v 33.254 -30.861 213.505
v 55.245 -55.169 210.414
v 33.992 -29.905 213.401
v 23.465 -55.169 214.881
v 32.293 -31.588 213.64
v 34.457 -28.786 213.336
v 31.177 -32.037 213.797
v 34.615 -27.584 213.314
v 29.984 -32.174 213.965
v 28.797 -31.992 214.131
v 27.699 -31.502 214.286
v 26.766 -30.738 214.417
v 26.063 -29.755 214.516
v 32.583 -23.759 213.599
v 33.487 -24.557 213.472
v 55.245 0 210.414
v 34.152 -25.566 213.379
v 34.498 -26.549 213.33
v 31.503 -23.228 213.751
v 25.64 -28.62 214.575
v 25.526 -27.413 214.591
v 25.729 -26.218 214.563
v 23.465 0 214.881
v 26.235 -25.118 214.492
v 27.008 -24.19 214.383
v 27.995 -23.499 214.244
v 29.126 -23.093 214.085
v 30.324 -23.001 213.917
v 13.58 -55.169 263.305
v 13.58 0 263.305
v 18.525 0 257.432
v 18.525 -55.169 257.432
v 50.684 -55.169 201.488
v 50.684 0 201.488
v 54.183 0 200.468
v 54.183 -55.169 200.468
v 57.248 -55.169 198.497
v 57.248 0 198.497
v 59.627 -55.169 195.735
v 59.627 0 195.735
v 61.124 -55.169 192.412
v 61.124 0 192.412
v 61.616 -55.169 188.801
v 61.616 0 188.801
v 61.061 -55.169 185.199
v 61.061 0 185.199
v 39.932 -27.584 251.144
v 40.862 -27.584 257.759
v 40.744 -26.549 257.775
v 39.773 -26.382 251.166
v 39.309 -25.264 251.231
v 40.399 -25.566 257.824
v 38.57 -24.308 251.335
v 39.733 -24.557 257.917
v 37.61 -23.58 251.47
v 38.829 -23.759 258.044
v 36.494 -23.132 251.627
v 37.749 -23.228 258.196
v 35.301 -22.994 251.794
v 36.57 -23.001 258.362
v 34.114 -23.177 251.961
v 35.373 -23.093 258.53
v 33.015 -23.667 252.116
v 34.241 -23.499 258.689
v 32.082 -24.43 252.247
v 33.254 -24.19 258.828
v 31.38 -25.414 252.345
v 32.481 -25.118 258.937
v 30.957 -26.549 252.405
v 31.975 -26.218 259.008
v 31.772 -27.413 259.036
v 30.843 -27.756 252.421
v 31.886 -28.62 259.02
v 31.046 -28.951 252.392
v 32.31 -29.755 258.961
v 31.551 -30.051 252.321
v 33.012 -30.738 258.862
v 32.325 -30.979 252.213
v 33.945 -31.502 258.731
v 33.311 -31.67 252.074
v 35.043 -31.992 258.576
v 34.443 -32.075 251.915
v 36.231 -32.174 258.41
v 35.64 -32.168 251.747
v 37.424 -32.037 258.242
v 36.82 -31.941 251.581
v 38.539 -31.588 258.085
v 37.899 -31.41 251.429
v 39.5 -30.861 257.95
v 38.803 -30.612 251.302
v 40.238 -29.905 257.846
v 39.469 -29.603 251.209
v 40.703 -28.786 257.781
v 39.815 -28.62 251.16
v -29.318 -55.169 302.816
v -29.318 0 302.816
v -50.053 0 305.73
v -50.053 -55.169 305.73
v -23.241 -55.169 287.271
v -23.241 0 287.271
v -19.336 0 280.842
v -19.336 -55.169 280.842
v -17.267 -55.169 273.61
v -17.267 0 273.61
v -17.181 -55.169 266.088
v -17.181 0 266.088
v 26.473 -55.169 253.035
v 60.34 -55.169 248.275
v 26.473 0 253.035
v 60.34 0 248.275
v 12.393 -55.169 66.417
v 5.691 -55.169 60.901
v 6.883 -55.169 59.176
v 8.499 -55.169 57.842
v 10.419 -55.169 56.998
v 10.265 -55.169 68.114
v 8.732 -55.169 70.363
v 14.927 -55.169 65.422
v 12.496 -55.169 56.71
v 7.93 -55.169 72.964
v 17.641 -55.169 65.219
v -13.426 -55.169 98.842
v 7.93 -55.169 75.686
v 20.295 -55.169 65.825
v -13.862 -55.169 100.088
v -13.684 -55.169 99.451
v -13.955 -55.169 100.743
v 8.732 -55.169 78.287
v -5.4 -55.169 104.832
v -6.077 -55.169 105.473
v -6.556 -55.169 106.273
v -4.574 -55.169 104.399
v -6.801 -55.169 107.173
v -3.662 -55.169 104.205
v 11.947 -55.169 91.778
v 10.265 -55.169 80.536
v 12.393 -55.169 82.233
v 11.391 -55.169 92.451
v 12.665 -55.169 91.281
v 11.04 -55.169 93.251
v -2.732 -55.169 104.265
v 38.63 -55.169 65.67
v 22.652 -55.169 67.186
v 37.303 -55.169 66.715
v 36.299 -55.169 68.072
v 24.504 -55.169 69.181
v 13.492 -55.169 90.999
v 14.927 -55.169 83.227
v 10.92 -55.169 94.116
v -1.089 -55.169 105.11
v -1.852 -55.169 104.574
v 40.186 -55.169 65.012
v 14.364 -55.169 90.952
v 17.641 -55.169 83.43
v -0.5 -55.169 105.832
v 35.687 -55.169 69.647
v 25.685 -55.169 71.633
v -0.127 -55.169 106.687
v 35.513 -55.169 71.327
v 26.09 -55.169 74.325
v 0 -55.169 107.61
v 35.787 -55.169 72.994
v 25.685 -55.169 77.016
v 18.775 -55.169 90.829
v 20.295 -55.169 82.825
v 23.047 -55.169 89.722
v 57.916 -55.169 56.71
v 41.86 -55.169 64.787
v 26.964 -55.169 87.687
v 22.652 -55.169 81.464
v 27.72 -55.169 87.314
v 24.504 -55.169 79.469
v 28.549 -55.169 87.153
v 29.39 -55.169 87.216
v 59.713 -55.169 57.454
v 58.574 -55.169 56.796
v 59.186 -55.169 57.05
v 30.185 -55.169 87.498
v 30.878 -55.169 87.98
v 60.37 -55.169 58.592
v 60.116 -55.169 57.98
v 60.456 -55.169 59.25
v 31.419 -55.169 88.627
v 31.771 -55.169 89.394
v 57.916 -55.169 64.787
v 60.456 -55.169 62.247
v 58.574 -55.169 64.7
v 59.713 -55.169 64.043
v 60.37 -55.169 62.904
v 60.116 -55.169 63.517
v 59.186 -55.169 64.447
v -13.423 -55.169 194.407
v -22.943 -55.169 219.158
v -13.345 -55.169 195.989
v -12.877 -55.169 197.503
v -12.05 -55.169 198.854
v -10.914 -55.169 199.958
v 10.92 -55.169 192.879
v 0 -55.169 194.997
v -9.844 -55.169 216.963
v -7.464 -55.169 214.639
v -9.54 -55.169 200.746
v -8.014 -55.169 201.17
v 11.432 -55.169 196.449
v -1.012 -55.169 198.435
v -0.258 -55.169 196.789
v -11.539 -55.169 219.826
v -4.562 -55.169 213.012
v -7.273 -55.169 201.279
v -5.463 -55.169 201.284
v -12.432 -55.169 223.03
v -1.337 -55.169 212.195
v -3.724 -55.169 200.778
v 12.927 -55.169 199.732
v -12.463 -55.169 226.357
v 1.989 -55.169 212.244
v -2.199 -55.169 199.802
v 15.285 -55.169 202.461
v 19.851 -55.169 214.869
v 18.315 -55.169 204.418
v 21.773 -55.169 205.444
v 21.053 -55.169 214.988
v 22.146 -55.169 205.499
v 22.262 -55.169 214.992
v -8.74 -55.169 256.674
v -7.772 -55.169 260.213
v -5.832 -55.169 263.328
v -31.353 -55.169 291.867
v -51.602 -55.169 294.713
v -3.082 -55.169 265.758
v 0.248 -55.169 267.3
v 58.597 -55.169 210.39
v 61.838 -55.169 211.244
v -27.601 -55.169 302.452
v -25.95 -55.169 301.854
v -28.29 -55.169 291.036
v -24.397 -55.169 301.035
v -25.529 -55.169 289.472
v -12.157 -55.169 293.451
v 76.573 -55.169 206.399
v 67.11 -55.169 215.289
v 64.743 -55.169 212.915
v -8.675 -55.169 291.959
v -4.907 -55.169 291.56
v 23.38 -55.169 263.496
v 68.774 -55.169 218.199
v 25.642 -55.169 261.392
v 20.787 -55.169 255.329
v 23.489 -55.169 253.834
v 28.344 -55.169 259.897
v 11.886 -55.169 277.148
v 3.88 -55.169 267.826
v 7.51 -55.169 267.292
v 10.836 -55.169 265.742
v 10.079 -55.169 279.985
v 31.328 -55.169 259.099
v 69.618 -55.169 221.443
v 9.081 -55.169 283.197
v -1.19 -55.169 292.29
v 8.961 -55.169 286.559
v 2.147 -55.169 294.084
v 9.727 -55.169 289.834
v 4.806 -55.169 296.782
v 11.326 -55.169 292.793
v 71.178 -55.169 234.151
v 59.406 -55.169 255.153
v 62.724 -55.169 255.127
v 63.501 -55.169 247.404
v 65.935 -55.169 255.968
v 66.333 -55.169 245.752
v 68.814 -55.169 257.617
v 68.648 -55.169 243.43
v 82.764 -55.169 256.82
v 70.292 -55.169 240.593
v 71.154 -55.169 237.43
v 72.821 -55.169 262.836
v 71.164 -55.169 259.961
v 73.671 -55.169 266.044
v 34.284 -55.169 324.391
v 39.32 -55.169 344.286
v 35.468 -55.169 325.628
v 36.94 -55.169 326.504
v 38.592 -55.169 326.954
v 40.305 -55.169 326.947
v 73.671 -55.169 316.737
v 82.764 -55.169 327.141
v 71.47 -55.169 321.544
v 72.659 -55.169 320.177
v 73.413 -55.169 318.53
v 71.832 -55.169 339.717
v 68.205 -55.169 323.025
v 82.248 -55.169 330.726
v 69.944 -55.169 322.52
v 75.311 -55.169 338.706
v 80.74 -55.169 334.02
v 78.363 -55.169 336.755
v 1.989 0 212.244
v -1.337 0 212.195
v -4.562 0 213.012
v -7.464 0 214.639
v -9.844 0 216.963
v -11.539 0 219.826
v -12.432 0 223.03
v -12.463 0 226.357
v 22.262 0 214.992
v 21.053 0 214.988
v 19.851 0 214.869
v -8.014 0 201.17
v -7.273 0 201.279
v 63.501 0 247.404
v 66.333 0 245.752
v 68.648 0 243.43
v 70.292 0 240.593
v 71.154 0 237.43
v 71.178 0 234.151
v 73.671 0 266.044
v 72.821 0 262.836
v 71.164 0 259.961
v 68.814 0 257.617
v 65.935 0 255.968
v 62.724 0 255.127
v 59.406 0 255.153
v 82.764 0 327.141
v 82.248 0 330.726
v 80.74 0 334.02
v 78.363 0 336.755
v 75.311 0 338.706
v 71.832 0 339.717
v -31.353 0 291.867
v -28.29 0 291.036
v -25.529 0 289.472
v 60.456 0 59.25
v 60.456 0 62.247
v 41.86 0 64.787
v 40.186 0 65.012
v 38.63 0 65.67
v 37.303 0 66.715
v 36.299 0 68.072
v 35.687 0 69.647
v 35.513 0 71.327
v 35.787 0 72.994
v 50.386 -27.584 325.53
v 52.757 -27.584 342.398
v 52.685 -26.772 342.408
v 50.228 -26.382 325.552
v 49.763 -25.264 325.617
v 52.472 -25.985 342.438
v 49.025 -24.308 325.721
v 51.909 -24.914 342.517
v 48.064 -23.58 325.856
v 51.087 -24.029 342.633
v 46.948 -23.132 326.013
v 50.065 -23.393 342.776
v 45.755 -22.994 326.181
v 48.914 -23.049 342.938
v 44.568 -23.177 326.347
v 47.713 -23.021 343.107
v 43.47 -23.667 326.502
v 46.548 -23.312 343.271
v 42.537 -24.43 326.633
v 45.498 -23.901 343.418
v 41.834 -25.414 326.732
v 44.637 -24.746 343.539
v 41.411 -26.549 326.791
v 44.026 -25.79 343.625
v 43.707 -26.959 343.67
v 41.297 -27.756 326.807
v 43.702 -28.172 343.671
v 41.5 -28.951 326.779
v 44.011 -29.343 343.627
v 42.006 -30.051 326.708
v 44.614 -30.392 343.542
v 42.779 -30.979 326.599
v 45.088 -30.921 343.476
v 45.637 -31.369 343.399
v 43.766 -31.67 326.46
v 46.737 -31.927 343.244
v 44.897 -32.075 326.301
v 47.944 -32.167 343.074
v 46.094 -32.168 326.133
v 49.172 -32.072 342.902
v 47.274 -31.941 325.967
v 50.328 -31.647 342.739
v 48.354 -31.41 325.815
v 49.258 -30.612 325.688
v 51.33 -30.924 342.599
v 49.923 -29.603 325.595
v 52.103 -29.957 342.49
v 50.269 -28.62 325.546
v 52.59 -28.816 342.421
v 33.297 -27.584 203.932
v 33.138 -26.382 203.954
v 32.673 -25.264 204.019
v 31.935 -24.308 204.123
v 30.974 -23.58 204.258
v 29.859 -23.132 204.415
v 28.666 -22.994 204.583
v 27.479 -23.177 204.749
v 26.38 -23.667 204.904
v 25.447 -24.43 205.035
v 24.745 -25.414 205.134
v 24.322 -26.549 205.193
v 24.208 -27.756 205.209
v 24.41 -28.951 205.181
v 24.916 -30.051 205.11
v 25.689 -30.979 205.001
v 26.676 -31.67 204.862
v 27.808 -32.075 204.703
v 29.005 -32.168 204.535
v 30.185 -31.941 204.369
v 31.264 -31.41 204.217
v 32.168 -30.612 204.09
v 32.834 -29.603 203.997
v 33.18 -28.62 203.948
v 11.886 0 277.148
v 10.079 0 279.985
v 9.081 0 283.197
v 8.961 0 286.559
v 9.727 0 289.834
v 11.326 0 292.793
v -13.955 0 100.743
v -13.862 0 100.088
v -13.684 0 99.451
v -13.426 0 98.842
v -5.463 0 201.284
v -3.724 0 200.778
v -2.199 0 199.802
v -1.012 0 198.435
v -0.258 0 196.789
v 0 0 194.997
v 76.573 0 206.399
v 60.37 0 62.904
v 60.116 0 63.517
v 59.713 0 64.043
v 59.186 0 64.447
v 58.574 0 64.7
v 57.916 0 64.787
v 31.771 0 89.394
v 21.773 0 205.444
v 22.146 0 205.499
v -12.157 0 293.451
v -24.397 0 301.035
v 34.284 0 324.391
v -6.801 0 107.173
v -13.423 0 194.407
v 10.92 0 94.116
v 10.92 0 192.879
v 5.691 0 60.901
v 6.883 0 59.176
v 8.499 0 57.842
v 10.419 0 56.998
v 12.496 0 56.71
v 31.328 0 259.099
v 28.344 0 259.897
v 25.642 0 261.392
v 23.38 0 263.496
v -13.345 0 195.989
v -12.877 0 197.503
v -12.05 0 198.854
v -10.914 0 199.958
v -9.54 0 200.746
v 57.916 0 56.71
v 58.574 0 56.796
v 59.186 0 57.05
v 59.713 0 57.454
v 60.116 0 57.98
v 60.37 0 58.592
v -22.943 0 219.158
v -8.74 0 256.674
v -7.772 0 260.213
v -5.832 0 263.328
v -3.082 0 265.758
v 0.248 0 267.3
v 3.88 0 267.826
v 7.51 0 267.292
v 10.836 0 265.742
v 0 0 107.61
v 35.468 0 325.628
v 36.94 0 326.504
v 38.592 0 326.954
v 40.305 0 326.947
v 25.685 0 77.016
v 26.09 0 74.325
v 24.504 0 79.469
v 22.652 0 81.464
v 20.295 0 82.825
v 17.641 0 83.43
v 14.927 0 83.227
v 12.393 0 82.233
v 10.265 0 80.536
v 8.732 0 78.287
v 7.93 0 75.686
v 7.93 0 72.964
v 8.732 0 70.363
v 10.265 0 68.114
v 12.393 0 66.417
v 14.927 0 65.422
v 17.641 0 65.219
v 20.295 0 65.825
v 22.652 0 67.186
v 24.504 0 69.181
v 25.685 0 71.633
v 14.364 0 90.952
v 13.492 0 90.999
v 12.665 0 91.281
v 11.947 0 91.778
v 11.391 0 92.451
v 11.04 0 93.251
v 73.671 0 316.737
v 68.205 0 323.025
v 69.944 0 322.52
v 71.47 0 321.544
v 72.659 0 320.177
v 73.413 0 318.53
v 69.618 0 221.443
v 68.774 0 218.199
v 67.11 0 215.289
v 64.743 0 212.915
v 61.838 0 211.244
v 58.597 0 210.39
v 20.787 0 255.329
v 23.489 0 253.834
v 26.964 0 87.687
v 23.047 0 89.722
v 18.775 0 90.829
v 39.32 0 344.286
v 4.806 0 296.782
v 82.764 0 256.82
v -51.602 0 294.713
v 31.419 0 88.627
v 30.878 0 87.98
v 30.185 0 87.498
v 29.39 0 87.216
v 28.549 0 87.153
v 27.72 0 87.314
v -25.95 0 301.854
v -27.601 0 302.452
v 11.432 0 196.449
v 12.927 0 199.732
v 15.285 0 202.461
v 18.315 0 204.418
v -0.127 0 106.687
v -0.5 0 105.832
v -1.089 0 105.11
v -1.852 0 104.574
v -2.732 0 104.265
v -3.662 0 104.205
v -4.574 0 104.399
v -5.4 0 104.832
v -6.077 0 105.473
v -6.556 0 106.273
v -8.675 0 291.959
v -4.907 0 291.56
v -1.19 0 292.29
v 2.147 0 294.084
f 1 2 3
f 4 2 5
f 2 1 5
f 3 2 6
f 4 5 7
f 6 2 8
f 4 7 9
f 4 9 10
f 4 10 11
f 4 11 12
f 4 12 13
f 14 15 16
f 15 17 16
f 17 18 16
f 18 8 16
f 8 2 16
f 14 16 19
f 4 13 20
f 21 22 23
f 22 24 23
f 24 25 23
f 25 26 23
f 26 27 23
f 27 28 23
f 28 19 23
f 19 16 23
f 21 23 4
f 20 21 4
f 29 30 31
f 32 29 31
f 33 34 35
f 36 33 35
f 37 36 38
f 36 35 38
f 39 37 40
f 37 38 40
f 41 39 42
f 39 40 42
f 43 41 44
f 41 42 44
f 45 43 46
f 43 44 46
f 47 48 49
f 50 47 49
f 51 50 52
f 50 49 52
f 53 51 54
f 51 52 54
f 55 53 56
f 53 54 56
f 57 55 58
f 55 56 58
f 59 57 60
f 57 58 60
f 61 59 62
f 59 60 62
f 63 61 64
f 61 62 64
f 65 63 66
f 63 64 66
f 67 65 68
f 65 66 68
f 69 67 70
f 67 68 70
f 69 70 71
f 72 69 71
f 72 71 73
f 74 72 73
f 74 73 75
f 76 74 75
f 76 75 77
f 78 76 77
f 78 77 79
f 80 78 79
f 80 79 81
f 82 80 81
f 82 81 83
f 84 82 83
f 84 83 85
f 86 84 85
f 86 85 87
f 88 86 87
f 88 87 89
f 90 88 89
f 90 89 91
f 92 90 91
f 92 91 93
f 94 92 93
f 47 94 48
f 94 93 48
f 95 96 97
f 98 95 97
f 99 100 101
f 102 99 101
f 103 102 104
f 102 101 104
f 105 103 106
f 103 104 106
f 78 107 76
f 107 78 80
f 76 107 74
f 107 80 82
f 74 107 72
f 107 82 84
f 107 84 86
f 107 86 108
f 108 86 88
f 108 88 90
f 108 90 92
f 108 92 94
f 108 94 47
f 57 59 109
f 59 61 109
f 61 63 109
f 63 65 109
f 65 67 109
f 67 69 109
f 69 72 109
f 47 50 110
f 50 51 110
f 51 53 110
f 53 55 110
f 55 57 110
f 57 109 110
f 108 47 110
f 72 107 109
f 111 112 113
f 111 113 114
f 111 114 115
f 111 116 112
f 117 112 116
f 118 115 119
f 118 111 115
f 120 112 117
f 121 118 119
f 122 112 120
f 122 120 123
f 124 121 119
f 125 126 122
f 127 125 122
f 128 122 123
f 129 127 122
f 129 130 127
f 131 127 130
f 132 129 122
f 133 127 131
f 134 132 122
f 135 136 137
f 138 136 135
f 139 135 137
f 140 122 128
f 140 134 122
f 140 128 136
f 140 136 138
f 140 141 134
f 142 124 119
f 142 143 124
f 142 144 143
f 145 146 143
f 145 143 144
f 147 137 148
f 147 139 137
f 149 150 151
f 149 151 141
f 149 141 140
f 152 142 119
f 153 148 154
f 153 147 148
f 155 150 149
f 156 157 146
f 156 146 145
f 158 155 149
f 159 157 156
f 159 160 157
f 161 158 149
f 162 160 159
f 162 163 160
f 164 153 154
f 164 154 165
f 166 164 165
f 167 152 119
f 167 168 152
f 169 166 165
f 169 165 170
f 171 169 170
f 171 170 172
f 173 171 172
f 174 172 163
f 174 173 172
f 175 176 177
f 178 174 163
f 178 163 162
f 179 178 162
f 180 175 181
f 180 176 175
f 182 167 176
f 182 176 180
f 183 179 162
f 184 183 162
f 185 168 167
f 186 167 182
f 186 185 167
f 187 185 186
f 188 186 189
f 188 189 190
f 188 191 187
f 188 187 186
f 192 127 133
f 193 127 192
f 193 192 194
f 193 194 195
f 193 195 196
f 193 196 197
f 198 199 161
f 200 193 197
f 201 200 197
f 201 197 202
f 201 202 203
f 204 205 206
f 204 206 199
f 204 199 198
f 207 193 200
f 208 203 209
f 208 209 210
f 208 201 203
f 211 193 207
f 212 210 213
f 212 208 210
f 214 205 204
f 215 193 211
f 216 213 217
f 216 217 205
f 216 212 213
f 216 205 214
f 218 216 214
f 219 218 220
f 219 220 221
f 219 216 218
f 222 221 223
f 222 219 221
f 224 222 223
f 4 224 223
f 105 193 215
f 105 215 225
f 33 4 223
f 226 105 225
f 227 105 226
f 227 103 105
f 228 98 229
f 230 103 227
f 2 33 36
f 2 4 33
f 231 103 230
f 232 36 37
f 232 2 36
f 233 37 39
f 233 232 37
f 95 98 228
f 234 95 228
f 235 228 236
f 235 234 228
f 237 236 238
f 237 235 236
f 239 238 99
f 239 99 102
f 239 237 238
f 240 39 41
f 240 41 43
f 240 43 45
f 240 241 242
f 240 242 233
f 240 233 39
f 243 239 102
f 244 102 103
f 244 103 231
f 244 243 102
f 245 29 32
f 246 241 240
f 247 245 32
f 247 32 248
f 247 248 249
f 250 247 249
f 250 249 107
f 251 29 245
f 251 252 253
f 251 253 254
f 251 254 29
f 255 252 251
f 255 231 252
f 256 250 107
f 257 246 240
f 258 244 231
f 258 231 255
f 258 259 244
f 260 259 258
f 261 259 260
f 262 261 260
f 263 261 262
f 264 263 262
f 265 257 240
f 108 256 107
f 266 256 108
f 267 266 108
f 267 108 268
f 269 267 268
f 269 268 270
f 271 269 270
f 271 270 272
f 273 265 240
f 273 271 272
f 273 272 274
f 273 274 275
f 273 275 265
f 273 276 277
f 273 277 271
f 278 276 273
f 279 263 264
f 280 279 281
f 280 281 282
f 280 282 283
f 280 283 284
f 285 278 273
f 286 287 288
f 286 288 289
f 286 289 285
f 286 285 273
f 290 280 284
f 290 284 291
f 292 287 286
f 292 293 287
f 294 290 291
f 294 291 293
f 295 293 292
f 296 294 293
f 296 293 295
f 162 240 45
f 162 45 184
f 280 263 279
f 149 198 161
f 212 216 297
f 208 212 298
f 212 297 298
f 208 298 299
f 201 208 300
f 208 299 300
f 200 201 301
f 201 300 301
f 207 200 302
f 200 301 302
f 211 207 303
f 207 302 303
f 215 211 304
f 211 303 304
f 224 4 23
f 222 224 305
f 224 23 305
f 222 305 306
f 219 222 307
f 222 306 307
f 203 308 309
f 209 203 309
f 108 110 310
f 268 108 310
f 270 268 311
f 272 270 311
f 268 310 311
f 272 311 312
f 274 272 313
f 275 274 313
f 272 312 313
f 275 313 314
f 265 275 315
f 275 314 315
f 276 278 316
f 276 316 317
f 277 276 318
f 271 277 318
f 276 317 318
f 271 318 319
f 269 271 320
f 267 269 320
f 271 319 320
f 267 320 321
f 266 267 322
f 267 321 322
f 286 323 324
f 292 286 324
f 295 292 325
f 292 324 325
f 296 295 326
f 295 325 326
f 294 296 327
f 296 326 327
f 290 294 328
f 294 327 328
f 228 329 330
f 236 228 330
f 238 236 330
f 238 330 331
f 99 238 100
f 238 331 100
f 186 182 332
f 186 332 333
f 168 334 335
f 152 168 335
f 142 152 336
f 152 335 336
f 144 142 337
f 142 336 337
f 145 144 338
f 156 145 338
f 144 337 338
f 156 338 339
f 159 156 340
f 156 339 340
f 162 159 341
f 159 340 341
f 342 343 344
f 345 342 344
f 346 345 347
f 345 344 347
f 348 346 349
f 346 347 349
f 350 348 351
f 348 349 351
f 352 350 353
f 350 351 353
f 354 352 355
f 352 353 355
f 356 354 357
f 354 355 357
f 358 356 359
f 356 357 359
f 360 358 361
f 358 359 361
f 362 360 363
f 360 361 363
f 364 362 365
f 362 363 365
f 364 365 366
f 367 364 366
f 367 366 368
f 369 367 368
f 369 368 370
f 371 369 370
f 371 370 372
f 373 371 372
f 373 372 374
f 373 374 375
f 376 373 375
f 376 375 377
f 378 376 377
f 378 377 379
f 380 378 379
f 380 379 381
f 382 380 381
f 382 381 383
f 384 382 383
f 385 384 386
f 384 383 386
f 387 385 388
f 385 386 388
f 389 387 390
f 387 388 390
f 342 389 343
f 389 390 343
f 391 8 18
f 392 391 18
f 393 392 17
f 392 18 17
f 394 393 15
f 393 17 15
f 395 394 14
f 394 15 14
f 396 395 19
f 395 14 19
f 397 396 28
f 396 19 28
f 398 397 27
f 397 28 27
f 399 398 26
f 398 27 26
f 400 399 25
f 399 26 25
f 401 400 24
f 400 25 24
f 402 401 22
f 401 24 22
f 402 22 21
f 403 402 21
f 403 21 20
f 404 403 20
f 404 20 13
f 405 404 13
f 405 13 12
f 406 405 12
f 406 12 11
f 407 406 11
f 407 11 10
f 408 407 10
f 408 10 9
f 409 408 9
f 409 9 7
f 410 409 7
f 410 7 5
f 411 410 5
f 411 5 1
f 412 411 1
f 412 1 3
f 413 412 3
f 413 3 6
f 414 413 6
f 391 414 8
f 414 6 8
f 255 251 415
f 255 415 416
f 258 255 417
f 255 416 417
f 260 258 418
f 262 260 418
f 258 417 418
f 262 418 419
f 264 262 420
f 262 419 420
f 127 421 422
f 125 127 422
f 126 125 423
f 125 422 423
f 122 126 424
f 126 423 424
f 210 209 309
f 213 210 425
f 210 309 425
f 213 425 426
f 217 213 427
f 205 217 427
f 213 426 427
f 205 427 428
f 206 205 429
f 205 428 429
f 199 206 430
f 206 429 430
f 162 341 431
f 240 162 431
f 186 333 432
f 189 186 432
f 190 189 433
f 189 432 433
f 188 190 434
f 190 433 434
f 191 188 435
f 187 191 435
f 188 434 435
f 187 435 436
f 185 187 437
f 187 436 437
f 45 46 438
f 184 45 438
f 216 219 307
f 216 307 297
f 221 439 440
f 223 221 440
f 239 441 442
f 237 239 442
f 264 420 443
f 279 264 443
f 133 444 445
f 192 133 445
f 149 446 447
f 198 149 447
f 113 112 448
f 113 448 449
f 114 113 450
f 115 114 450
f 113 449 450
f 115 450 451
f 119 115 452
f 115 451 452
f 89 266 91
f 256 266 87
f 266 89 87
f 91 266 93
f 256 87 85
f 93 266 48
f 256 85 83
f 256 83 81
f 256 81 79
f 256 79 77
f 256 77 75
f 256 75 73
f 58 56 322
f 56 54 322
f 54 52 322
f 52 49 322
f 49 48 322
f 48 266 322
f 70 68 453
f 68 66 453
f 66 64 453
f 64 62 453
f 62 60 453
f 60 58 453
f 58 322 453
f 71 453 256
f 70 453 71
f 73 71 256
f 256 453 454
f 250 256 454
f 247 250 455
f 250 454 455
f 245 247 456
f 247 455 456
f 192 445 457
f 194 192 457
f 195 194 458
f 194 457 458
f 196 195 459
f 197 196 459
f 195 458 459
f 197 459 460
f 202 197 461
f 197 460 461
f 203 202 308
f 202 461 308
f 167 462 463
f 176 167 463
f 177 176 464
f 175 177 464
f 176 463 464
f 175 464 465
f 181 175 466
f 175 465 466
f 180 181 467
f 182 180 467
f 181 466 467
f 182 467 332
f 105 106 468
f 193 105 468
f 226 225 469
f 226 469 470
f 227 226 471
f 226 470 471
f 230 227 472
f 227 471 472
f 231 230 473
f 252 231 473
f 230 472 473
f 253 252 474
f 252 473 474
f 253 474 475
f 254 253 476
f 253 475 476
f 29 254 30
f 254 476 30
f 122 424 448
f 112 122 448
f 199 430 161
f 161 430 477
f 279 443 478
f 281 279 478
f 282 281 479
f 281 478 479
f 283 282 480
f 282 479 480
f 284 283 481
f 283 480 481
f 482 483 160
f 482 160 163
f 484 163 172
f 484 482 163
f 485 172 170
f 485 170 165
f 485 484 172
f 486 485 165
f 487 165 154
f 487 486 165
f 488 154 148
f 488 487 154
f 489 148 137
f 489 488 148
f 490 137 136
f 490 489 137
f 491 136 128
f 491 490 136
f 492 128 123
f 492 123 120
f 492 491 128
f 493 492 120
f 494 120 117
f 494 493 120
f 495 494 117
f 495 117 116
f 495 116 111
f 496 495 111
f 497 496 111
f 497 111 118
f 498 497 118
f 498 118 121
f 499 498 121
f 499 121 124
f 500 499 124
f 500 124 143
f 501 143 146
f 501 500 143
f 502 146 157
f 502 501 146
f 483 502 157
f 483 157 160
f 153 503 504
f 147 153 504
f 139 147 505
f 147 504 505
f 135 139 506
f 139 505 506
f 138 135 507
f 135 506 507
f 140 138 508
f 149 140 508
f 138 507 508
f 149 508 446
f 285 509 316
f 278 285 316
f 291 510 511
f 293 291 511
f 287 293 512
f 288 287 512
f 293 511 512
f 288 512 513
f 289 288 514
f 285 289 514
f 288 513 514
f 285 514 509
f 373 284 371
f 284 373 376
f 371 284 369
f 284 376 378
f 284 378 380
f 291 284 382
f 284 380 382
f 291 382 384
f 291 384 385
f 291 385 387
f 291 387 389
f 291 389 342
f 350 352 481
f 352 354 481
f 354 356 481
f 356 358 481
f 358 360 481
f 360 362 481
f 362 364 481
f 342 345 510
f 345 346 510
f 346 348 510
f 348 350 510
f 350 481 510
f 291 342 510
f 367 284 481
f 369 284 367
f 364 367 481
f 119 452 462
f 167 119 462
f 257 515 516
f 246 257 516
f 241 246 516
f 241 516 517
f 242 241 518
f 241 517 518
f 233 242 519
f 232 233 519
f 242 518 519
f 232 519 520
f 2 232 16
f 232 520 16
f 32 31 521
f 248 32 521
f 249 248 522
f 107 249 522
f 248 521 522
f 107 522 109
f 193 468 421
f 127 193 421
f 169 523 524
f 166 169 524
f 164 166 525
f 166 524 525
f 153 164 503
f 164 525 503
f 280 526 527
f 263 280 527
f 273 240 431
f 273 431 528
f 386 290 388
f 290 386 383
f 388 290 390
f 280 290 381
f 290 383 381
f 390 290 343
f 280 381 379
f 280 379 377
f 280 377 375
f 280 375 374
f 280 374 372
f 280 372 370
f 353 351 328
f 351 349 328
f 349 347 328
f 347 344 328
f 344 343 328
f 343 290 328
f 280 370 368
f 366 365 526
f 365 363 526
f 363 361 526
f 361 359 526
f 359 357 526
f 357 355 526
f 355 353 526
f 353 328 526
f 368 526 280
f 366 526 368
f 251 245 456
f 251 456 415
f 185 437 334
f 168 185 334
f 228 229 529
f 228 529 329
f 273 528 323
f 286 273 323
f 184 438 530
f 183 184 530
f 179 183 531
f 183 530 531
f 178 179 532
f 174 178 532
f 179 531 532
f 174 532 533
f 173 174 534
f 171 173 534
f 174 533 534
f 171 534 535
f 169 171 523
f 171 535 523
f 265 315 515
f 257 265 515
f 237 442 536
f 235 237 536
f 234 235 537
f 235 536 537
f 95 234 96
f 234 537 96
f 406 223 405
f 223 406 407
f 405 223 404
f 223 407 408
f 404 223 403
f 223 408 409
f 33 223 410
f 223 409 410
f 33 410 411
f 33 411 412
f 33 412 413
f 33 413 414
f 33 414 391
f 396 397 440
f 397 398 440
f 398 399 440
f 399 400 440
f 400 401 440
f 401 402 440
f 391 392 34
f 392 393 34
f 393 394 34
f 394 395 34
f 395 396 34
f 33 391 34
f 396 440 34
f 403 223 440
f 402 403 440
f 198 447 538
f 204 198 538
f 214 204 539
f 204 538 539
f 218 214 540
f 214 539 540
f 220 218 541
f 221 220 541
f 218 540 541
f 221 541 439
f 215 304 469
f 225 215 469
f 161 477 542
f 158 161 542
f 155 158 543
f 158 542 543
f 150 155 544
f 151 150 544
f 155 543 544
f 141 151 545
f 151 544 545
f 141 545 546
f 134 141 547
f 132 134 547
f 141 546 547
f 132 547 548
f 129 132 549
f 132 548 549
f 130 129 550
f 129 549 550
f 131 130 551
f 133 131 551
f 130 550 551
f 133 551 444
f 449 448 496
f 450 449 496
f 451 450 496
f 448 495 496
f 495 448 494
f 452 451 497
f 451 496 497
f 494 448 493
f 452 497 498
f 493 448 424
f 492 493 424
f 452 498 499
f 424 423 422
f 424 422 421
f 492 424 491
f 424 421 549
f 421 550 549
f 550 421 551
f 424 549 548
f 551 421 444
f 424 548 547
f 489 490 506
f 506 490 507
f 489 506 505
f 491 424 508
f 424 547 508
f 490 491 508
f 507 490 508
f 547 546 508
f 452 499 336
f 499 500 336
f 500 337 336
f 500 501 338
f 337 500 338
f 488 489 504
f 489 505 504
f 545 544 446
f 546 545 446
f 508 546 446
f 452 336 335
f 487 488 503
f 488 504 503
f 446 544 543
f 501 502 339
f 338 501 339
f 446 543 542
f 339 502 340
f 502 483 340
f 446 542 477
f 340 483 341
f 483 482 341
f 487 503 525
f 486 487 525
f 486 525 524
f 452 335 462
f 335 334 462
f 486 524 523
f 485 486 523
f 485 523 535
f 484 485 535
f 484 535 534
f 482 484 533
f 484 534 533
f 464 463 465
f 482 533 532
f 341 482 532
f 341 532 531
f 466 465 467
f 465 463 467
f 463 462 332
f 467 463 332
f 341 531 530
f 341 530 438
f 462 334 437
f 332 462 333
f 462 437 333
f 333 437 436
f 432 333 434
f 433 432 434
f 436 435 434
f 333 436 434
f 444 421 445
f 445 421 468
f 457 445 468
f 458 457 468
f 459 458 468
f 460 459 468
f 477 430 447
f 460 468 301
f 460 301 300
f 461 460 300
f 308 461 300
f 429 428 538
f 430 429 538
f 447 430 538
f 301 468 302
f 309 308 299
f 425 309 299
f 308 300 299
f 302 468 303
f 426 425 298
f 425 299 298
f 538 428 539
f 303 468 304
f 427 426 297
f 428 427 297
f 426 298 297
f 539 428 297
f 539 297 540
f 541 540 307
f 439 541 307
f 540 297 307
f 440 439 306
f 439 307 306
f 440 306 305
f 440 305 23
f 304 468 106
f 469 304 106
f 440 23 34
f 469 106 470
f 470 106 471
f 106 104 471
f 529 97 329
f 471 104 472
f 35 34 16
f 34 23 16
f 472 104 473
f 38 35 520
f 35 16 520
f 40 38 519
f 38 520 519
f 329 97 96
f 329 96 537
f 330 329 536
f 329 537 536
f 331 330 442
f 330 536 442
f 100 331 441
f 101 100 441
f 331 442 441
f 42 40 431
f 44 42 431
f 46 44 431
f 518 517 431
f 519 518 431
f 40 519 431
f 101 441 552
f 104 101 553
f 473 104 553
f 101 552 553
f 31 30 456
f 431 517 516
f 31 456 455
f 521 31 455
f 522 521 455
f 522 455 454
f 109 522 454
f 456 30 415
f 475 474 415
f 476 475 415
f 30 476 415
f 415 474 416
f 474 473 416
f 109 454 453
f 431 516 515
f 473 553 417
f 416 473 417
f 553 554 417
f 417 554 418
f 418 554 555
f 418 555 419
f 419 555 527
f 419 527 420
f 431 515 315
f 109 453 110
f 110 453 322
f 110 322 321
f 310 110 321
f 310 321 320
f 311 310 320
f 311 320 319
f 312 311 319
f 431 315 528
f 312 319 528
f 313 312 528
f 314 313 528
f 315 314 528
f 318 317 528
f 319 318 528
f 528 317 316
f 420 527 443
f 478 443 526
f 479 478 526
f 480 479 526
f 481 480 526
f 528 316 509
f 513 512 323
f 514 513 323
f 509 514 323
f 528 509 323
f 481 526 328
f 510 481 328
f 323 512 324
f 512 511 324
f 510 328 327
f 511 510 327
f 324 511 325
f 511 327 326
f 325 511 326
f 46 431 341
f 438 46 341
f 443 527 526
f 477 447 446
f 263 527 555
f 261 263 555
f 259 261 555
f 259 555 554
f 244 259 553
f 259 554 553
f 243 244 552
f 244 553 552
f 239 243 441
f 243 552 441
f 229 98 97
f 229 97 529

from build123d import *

# Parameters (mm, degrees)
F0_R     = 9.1313
F1_DEPTH = 55.1688
F2_R     = 4.590873
F3_DEPTH = 152.4


with BuildPart() as f1:
    # F0 (on Front) → F1 (new body)
    with BuildSketch(Plane.XZ):
        with BuildLine():
            ThreePointArc((5.690516, 60.901123), (8.49944, 57.841701), (12.495555, 56.709803))
            Line((12.495555, 56.709803), (57.916488, 56.709803))
            ThreePointArc((57.916488, 56.709803), (59.71254, 57.453752), (60.456488, 59.249803))
            Line((60.456488, 59.249803), (60.456488, 62.247003))
            ThreePointArc((60.456488, 62.247003), (59.71254, 64.043054), (57.916488, 64.787003))
            Line((57.916488, 64.787003), (41.860021, 64.787003))
            ThreePointArc((41.860021, 64.787003), (36.75553, 67.359878), (35.787486, 72.993563))
            Line((35.787486, 72.993563), (76.573475, 206.398524))
            Line((76.573475, 206.398524), (82.764438, 256.819868))
            Line((82.764438, 256.819868), (82.764438, 327.140741))
            ThreePointArc((82.764438, 327.140741), (79.649249, 335.472691), (71.831936, 339.717145))
            Line((71.831936, 339.717145), (39.319936, 344.286409))
            Line((39.319936, 344.286409), (4.80626, 296.78241))
            ThreePointArc((4.80626, 296.78241), (-3.021214, 291.785261), (-12.157108, 293.451485))
            Line((-12.157108, 293.451485), (-24.39685, 301.034975))
            ThreePointArc((-24.39685, 301.034975), (-26.76481, 302.181534), (-29.318204, 302.815581))
            Line((-29.318204, 302.815581), (-50.053234, 305.729699))
            Line((-50.053234, 305.729699), (-51.601562, 294.712769))
            Line((-51.601562, 294.712769), (-31.353263, 291.867056))
            ThreePointArc((-31.353263, 291.867056), (-26.860403, 290.340444), (-23.241498, 287.271263))
            ThreePointArc((-23.241498, 287.271263), (-18.05967, 277.295323), (-17.18101, 266.08824))
            Line((-17.18101, 266.08824), (-22.943347, 219.157768))
            Line((-22.943347, 219.157768), (-13.954531, 100.743315))
            ThreePointArc((-13.954531, 100.743315), (-13.783375, 99.766758), (-13.425797, 98.842044))
            Line((-13.425797, 98.842044), (5.690516, 60.901123))
        make_face()
        with BuildLine():
            ThreePointArc((0, 107.610365), (-3.195116, 104.203), (-6.80066, 107.172673))
            Line((-6.80066, 107.172673), (-13.422605, 194.407079))
            ThreePointArc((-13.422605, 194.407079), (-12.050117, 198.853564), (-8.01427, 201.170218))
            Line((-8.01427, 201.170218), (-7.273448, 201.27911))
            ThreePointArc((-7.273448, 201.27911), (-2.199181, 199.802153), (0, 194.996615))
            Line((0, 194.996615), (0, 107.610365))
        make_face(mode=Mode.SUBTRACT)
        with Locations((16.958988, 74.324703)):
            Circle(F0_R, mode=Mode.SUBTRACT)
        with BuildLine():
            Line((21.773085, 205.443941), (22.146465, 205.498823))
            Line((22.146465, 205.498823), (50.683851, 201.488155))
            ThreePointArc((50.683851, 201.488155), (59.627424, 195.735456), (61.061423, 185.19863))
            Line((61.061423, 185.19863), (31.771058, 89.394163))
            ThreePointArc((31.771058, 89.394163), (29.797055, 87.330417), (26.963626, 87.687371))
            ThreePointArc((26.963626, 87.687371), (20.942359, 90.395582), (14.363594, 90.952282))
            ThreePointArc((14.363594, 90.952282), (11.946985, 91.777794), (10.919982, 94.115899))
            Line((10.919982, 94.115899), (10.919982, 192.878951))
            ThreePointArc((10.919982, 192.878951), (14.008905, 201.18059), (21.773085, 205.443941))
        make_face(mode=Mode.SUBTRACT)
        with BuildLine():
            Line((55.24467, 210.414482), (23.465019, 214.880821))
            ThreePointArc((23.465019, 214.880821), (21.657413, 215.004353), (19.850623, 214.869406))
            Line((19.850623, 214.869406), (1.98934, 212.244021))
            ThreePointArc((1.98934, 212.244021), (-8.730453, 215.722663), (-12.462892, 226.356751))
            Line((-12.462892, 226.356751), (-8.740444, 256.673662))
            ThreePointArc((-8.740444, 256.673662), (0.247859, 267.299954), (13.580182, 263.305356))
            Line((13.580182, 263.305356), (18.524945, 257.432113))
            ThreePointArc((18.524945, 257.432113), (22.092313, 254.498804), (26.472736, 253.035143))
            Line((26.472736, 253.035143), (60.340027, 248.275405))
            ThreePointArc((60.340027, 248.275405), (68.648116, 243.430271), (71.177865, 234.15126))
            Line((71.177865, 234.15126), (69.617505, 221.443146))
            ThreePointArc((69.617505, 221.443146), (64.743439, 212.915299), (55.24467, 210.414482))
        make_face(mode=Mode.SUBTRACT)
        with BuildLine():
            Line((59.405725, 255.152563), (31.327721, 259.098669))
            ThreePointArc((31.327721, 259.098669), (26.947298, 260.562331), (23.37993, 263.495639))
            Line((23.37993, 263.495639), (11.885566, 277.148304))
            ThreePointArc((11.885566, 277.148304), (8.908962, 284.87405), (11.32634, 292.792611))
            Line((11.32634, 292.792611), (34.283751, 324.390777))
            ThreePointArc((34.283751, 324.390777), (36.939866, 326.503546), (40.304758, 326.946542))
            Line((40.304758, 326.946542), (68.204987, 323.025421))
            ThreePointArc((68.204987, 323.025421), (72.113644, 320.903194), (73.671238, 316.737219))
            Line((73.671238, 316.737219), (73.671238, 266.044077))
            ThreePointArc((73.671238, 266.044077), (68.814325, 257.61746), (59.405725, 255.152563))
        make_face(mode=Mode.SUBTRACT)
    extrude(amount=F1_DEPTH)

    # F2 (on face) → F3 (cut)
    with BuildSketch(Plane(origin=(48.210692, 0, 343.036895), x_dir=(0.990268, 0, -0.139173), z_dir=(0.139173, 0, 0.990268))):
        with Locations((0, -27.5844)):
            Circle(F2_R)
    extrude(amount=-F3_DEPTH, mode=Mode.SUBTRACT)


solid = f1.part
